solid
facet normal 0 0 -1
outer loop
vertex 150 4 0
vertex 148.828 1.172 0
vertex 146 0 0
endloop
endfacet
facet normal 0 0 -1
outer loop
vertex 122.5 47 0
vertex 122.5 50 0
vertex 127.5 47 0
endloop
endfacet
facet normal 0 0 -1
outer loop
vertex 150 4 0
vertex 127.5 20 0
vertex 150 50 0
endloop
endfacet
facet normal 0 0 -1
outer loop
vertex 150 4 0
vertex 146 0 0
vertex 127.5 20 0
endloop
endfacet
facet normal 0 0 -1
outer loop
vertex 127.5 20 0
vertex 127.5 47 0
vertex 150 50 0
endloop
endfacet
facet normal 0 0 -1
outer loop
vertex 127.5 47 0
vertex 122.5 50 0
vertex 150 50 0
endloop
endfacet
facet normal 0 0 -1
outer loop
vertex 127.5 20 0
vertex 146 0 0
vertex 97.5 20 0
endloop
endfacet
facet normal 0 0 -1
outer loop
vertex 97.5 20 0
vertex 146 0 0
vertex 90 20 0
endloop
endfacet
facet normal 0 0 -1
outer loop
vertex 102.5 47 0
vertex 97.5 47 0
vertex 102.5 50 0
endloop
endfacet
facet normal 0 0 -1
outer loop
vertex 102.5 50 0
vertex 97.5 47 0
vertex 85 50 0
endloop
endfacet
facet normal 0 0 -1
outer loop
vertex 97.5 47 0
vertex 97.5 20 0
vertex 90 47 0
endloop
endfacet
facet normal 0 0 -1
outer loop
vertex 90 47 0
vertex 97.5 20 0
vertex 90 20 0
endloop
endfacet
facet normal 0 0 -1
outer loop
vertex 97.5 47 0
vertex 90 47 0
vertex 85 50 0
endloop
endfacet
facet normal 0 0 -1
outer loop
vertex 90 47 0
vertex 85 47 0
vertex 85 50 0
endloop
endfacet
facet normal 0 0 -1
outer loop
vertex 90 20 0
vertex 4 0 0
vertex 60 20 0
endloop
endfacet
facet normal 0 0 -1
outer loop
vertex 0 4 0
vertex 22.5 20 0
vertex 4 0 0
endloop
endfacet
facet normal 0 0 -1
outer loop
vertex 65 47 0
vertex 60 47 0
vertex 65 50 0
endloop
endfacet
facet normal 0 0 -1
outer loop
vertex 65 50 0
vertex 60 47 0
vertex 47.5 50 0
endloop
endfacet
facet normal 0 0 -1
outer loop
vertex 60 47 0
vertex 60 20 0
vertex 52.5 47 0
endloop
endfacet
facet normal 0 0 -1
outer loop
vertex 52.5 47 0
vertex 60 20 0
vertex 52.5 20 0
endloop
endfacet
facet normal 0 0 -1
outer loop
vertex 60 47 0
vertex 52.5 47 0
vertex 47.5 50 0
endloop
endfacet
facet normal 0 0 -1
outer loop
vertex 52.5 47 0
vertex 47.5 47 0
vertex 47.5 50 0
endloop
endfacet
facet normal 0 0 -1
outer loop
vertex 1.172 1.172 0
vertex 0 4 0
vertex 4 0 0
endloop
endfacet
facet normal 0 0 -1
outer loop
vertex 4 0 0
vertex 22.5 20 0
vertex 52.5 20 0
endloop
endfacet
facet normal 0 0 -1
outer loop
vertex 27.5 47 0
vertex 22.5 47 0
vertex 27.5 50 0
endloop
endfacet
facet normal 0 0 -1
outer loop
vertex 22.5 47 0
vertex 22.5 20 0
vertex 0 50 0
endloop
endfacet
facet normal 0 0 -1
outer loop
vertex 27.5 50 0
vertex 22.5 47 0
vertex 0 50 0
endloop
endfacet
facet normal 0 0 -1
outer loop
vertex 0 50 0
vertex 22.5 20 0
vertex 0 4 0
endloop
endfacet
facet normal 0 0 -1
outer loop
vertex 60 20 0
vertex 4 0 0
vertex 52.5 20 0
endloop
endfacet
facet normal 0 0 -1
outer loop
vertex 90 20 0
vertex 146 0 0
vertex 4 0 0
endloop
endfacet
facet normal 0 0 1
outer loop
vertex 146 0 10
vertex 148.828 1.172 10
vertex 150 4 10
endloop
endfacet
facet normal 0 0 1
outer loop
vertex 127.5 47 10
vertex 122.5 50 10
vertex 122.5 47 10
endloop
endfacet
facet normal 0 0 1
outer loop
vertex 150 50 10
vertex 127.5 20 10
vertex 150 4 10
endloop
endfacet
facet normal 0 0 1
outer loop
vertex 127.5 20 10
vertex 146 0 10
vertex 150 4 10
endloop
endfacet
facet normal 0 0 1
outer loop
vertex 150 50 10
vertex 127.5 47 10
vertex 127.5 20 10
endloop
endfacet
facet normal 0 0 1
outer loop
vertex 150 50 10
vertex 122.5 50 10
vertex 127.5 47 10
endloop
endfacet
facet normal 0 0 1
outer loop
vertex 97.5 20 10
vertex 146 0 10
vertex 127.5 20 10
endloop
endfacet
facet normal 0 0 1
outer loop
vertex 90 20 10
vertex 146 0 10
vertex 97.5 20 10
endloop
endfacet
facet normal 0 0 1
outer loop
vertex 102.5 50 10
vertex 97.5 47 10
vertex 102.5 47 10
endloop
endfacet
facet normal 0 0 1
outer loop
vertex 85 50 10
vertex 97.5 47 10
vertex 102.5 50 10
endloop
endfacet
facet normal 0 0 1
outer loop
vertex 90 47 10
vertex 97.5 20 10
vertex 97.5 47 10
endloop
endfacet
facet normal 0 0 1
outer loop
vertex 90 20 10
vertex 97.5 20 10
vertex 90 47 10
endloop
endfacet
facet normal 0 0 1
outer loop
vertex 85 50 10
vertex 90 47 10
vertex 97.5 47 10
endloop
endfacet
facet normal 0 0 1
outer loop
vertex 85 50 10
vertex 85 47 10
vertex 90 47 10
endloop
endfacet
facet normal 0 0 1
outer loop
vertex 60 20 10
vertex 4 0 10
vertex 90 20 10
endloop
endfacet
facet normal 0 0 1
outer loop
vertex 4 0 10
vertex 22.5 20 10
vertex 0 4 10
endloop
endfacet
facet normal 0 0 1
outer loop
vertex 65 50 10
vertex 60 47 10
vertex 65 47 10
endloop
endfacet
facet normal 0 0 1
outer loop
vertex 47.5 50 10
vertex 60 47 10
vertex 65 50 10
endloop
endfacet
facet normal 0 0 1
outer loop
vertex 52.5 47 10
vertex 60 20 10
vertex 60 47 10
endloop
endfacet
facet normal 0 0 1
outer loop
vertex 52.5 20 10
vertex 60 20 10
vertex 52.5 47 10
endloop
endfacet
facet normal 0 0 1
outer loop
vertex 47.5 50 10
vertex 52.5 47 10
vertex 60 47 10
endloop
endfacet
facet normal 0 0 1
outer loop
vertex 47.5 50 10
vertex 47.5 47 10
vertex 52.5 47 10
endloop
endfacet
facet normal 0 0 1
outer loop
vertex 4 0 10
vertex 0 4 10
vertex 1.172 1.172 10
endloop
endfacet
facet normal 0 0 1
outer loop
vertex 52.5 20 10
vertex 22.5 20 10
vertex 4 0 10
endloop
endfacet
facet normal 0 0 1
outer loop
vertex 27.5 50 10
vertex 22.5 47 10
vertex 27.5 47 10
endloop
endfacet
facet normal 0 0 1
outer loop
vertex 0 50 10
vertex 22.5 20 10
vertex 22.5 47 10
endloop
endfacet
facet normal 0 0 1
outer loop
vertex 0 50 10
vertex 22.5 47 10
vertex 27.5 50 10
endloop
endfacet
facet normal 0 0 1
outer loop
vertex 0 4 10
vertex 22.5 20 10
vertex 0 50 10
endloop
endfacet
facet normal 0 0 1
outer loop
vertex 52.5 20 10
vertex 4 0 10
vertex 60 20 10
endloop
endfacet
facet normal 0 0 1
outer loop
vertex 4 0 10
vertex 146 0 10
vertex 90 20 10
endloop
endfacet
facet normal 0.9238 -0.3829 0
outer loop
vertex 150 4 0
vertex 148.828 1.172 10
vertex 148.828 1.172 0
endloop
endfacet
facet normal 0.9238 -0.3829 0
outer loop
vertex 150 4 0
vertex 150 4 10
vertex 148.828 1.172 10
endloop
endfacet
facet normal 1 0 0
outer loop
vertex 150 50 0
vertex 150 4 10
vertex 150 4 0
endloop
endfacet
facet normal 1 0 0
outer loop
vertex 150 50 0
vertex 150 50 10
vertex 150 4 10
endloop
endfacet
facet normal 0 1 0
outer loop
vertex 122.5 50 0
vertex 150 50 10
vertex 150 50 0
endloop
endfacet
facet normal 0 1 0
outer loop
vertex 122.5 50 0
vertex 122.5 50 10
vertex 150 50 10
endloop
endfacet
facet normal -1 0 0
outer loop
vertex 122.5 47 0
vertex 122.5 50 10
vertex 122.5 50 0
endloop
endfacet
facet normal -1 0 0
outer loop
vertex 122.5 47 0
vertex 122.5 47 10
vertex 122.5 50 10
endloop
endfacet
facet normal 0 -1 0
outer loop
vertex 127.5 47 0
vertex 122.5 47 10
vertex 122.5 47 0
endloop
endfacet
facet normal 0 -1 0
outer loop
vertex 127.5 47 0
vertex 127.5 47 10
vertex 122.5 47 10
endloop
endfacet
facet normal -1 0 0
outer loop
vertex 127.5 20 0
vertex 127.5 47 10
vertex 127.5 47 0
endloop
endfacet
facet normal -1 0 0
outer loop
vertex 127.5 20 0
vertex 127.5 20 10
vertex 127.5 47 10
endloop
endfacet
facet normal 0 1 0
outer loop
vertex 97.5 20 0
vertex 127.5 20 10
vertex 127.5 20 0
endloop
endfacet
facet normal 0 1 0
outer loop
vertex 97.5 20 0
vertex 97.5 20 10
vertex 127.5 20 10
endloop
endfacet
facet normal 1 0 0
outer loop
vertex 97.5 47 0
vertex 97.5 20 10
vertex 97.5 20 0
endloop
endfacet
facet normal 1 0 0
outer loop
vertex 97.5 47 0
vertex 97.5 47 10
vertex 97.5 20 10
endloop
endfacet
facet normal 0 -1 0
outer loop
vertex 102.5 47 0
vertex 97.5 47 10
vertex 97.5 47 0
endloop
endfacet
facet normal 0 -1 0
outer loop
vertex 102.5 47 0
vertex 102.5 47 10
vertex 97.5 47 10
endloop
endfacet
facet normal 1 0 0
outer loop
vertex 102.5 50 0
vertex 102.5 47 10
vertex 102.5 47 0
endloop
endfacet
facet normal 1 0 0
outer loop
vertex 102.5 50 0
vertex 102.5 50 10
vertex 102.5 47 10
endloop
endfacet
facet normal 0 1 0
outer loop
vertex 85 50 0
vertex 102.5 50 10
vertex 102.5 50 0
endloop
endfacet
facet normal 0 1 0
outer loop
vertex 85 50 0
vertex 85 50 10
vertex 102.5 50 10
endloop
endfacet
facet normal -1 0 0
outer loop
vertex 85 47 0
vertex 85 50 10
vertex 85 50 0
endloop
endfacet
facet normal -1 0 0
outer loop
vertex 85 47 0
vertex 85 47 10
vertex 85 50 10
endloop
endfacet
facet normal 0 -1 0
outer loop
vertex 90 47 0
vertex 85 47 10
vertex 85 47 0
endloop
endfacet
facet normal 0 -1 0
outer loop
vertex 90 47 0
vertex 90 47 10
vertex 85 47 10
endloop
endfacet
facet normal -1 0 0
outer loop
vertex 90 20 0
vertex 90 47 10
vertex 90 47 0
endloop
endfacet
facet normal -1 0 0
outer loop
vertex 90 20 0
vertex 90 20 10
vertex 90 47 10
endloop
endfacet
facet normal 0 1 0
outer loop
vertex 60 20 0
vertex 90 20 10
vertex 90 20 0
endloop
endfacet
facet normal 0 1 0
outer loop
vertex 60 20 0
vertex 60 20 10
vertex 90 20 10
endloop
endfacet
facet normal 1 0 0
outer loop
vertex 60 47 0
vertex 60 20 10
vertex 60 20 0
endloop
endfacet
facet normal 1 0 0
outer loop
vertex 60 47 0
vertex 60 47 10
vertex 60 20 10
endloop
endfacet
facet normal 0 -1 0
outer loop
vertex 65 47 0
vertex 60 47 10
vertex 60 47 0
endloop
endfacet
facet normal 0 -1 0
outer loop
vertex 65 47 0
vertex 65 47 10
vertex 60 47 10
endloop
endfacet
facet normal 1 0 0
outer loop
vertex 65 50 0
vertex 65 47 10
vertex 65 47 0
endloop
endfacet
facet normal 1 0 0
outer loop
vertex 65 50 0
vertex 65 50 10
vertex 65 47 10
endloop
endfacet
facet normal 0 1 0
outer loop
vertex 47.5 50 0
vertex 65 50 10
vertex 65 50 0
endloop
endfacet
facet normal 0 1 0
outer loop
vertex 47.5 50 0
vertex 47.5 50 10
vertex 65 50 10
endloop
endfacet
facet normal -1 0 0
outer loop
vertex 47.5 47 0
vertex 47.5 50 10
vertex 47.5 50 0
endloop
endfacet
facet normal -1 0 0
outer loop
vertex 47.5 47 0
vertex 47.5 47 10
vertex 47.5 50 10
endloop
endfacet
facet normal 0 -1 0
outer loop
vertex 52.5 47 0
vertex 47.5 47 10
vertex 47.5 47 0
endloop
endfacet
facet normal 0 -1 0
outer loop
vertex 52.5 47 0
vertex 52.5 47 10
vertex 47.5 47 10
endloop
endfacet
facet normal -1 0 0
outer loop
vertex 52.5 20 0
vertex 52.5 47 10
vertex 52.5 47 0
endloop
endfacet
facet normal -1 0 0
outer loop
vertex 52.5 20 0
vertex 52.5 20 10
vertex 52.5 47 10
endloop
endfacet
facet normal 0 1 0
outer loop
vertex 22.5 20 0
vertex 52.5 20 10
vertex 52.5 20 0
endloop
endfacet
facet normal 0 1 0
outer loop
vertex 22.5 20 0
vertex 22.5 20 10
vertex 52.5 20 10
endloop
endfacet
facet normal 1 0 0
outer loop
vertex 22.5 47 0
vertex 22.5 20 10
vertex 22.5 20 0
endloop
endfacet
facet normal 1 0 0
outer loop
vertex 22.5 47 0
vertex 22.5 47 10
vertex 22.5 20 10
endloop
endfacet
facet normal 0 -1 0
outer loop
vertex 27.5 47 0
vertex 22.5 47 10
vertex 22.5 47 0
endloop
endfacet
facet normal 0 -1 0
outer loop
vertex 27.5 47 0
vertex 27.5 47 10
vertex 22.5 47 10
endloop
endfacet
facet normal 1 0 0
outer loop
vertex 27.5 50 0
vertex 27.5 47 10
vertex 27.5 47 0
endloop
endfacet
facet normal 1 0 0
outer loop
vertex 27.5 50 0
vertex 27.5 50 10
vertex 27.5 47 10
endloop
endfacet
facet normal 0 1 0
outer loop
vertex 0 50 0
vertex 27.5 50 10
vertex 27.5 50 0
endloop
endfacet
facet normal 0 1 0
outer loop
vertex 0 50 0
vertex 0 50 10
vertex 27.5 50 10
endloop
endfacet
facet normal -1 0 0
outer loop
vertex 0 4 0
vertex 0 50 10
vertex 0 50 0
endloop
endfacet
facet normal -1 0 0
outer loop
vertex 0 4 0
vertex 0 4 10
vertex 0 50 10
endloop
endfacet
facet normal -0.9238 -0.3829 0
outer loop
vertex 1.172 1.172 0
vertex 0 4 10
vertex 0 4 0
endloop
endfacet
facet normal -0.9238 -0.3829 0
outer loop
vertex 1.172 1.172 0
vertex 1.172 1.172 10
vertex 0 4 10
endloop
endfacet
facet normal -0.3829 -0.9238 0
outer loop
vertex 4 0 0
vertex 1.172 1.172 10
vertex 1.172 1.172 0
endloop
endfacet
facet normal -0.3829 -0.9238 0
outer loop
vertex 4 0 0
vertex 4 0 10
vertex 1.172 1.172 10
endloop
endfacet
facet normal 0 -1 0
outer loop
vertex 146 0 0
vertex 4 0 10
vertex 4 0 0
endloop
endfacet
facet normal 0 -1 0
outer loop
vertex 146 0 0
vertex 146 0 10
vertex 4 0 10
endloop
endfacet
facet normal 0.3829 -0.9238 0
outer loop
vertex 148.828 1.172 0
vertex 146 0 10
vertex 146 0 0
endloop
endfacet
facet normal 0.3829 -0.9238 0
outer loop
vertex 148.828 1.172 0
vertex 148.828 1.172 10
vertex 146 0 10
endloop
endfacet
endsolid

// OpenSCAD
$fn = 32;

// ----------------------------------------------------------------------
// Oversize slot bar: 150 mm bar with 3 oversize windows
// ----------------------------------------------------------------------

// --- parameters (mm) ---
profile_height = 10;      // extrusion height
profile_points = 32;      // points of the closed outline

profile = [[0, 4], [1.172, 1.172], [4, 0], [146, 0], [148.828, 1.172], [150, 4], [150, 50], [122.5, 50], [122.5, 47], [127.5, 47], [127.5, 20], [97.5, 20], [97.5, 47], [102.5, 47], [102.5, 50], [85, 50], [85, 47], [90, 47], [90, 20], [60, 20], [60, 47], [65, 47], [65, 50], [47.5, 50], [47.5, 47], [52.5, 47], [52.5, 20], [22.5, 20], [22.5, 47], [27.5, 47], [27.5, 50], [0, 50]];  // single closed polygon, 32 points, counter clockwise

// --- the one profile operation ---
linear_extrude(height = profile_height) polygon(points = profile);
